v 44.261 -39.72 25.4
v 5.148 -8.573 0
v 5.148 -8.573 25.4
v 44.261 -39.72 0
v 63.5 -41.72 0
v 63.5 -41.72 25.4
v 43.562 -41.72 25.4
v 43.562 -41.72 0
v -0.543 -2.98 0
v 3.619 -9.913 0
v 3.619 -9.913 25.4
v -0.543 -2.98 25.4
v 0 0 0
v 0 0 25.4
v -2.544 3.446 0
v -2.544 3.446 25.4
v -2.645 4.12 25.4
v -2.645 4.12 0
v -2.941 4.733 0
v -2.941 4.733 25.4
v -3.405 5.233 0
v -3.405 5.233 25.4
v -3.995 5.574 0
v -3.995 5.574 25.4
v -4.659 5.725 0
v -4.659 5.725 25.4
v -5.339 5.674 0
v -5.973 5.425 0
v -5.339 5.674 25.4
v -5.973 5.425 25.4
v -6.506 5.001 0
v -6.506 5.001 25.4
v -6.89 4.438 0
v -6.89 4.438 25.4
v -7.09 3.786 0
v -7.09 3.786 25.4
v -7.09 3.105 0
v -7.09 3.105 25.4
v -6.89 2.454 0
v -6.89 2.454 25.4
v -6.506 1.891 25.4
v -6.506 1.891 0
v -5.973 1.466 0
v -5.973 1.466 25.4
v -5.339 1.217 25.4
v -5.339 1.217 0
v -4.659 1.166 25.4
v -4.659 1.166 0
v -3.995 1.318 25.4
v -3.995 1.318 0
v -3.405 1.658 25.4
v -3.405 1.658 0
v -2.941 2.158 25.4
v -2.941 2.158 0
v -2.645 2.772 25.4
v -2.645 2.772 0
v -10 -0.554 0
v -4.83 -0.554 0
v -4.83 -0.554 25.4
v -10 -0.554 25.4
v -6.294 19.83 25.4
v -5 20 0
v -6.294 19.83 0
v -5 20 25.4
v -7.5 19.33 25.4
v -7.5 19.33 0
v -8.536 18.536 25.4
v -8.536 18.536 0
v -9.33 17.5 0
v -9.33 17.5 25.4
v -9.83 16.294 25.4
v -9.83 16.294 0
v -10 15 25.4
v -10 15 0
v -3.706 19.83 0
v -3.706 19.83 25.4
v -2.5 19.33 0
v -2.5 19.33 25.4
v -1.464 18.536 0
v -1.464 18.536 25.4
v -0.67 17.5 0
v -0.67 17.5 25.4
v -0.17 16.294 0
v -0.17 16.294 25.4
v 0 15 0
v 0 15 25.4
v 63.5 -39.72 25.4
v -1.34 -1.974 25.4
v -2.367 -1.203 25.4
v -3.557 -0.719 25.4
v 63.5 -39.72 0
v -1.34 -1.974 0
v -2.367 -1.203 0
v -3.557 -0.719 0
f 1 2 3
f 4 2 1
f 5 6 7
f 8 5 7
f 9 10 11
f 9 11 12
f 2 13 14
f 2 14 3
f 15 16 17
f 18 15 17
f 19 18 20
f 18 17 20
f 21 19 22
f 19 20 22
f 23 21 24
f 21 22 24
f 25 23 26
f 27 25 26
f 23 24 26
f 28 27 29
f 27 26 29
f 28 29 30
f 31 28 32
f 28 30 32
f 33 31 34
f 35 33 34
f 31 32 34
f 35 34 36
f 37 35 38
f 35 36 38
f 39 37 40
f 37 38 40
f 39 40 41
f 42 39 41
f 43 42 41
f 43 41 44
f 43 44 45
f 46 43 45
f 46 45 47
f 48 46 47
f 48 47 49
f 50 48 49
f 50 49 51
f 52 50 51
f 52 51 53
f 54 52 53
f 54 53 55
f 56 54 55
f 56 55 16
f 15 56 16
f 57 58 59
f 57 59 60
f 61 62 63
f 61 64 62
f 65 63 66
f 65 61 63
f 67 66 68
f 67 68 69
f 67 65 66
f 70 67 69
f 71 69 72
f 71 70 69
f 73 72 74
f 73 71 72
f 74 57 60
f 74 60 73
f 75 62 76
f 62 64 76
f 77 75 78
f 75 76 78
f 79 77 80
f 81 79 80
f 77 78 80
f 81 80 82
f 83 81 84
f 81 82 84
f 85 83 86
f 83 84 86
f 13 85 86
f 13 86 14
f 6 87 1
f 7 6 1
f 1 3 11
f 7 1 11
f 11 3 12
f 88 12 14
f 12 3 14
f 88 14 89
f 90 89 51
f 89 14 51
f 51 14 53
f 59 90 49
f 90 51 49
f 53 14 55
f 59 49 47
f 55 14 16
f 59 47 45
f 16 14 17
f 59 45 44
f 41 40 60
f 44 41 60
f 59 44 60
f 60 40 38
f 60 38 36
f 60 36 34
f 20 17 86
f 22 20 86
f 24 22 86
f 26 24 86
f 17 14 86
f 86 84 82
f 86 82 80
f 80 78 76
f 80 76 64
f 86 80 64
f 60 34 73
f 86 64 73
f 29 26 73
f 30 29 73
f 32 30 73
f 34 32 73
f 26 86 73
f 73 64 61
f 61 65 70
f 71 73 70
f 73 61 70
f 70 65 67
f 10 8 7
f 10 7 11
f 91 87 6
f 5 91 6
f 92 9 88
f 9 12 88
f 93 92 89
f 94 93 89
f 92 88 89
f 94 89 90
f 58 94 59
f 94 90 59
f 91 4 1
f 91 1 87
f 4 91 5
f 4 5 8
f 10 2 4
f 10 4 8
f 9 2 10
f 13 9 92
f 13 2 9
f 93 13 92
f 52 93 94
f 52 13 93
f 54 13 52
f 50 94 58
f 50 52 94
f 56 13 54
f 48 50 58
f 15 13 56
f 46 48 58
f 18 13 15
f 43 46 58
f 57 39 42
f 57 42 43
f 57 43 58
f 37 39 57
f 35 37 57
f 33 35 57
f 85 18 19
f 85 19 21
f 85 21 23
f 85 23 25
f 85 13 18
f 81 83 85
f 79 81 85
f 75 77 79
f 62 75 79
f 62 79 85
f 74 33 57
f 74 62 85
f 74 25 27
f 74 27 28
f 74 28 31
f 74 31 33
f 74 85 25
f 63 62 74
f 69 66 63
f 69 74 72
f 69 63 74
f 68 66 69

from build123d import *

# Parameters (mm, degrees)
BOSS_EXTRUDE1_DEPTH = 25.4
FILLET1_R           = 5
FILLET2_R           = 5
FILLET3_R           = 5
SKETCH2_R           = 2.286
CUT_EXTRUDE2_DEPTH  = 81.112257119


with BuildPart() as part:
    # Sketch1 → Boss-Extrude1 (new body)
    with BuildSketch(Plane.XY):
        Polygon((0, 0), (5.147680359, -8.573294986), (44.26134523, -39.720064006), (63.5, -39.720064006), (63.5, -41.720064006), (43.562310597, -41.720064006), (3.619073412, -9.912694725), (-2, -0.554309869), (-10, -0.554309869), (-10, 20), (0, 20), align=None)
    extrude(amount=BOSS_EXTRUDE1_DEPTH)

    # Fillet1
    fillet1_edges = [part.edges().sort_by_distance(p)[0] for p in [
        (-2, -0.554309869, 12.7),
    ]]
    fillet(fillet1_edges, radius=FILLET1_R)

    # Fillet2
    fillet2_edges = [part.edges().sort_by_distance(p)[0] for p in [
        (0, 20, 12.7),
    ]]
    fillet(fillet2_edges, radius=FILLET2_R)

    # Fillet3
    fillet3_edges = [part.edges().sort_by_distance(p)[0] for p in [
        (-10, 20, 12.7),
    ]]
    fillet(fillet3_edges, radius=FILLET3_R - 0.0001)  # a hair under: the kernel refuses the full size

    # Sketch2 → Cut-Extrude2 (cut, through all)
    with BuildSketch(Plane.XY.offset(25.4)):
        with Locations((-4.829903584, 3.445690131)):
            Circle(SKETCH2_R)
    extrude(amount=-CUT_EXTRUDE2_DEPTH, mode=Mode.SUBTRACT)


solid = part.part
